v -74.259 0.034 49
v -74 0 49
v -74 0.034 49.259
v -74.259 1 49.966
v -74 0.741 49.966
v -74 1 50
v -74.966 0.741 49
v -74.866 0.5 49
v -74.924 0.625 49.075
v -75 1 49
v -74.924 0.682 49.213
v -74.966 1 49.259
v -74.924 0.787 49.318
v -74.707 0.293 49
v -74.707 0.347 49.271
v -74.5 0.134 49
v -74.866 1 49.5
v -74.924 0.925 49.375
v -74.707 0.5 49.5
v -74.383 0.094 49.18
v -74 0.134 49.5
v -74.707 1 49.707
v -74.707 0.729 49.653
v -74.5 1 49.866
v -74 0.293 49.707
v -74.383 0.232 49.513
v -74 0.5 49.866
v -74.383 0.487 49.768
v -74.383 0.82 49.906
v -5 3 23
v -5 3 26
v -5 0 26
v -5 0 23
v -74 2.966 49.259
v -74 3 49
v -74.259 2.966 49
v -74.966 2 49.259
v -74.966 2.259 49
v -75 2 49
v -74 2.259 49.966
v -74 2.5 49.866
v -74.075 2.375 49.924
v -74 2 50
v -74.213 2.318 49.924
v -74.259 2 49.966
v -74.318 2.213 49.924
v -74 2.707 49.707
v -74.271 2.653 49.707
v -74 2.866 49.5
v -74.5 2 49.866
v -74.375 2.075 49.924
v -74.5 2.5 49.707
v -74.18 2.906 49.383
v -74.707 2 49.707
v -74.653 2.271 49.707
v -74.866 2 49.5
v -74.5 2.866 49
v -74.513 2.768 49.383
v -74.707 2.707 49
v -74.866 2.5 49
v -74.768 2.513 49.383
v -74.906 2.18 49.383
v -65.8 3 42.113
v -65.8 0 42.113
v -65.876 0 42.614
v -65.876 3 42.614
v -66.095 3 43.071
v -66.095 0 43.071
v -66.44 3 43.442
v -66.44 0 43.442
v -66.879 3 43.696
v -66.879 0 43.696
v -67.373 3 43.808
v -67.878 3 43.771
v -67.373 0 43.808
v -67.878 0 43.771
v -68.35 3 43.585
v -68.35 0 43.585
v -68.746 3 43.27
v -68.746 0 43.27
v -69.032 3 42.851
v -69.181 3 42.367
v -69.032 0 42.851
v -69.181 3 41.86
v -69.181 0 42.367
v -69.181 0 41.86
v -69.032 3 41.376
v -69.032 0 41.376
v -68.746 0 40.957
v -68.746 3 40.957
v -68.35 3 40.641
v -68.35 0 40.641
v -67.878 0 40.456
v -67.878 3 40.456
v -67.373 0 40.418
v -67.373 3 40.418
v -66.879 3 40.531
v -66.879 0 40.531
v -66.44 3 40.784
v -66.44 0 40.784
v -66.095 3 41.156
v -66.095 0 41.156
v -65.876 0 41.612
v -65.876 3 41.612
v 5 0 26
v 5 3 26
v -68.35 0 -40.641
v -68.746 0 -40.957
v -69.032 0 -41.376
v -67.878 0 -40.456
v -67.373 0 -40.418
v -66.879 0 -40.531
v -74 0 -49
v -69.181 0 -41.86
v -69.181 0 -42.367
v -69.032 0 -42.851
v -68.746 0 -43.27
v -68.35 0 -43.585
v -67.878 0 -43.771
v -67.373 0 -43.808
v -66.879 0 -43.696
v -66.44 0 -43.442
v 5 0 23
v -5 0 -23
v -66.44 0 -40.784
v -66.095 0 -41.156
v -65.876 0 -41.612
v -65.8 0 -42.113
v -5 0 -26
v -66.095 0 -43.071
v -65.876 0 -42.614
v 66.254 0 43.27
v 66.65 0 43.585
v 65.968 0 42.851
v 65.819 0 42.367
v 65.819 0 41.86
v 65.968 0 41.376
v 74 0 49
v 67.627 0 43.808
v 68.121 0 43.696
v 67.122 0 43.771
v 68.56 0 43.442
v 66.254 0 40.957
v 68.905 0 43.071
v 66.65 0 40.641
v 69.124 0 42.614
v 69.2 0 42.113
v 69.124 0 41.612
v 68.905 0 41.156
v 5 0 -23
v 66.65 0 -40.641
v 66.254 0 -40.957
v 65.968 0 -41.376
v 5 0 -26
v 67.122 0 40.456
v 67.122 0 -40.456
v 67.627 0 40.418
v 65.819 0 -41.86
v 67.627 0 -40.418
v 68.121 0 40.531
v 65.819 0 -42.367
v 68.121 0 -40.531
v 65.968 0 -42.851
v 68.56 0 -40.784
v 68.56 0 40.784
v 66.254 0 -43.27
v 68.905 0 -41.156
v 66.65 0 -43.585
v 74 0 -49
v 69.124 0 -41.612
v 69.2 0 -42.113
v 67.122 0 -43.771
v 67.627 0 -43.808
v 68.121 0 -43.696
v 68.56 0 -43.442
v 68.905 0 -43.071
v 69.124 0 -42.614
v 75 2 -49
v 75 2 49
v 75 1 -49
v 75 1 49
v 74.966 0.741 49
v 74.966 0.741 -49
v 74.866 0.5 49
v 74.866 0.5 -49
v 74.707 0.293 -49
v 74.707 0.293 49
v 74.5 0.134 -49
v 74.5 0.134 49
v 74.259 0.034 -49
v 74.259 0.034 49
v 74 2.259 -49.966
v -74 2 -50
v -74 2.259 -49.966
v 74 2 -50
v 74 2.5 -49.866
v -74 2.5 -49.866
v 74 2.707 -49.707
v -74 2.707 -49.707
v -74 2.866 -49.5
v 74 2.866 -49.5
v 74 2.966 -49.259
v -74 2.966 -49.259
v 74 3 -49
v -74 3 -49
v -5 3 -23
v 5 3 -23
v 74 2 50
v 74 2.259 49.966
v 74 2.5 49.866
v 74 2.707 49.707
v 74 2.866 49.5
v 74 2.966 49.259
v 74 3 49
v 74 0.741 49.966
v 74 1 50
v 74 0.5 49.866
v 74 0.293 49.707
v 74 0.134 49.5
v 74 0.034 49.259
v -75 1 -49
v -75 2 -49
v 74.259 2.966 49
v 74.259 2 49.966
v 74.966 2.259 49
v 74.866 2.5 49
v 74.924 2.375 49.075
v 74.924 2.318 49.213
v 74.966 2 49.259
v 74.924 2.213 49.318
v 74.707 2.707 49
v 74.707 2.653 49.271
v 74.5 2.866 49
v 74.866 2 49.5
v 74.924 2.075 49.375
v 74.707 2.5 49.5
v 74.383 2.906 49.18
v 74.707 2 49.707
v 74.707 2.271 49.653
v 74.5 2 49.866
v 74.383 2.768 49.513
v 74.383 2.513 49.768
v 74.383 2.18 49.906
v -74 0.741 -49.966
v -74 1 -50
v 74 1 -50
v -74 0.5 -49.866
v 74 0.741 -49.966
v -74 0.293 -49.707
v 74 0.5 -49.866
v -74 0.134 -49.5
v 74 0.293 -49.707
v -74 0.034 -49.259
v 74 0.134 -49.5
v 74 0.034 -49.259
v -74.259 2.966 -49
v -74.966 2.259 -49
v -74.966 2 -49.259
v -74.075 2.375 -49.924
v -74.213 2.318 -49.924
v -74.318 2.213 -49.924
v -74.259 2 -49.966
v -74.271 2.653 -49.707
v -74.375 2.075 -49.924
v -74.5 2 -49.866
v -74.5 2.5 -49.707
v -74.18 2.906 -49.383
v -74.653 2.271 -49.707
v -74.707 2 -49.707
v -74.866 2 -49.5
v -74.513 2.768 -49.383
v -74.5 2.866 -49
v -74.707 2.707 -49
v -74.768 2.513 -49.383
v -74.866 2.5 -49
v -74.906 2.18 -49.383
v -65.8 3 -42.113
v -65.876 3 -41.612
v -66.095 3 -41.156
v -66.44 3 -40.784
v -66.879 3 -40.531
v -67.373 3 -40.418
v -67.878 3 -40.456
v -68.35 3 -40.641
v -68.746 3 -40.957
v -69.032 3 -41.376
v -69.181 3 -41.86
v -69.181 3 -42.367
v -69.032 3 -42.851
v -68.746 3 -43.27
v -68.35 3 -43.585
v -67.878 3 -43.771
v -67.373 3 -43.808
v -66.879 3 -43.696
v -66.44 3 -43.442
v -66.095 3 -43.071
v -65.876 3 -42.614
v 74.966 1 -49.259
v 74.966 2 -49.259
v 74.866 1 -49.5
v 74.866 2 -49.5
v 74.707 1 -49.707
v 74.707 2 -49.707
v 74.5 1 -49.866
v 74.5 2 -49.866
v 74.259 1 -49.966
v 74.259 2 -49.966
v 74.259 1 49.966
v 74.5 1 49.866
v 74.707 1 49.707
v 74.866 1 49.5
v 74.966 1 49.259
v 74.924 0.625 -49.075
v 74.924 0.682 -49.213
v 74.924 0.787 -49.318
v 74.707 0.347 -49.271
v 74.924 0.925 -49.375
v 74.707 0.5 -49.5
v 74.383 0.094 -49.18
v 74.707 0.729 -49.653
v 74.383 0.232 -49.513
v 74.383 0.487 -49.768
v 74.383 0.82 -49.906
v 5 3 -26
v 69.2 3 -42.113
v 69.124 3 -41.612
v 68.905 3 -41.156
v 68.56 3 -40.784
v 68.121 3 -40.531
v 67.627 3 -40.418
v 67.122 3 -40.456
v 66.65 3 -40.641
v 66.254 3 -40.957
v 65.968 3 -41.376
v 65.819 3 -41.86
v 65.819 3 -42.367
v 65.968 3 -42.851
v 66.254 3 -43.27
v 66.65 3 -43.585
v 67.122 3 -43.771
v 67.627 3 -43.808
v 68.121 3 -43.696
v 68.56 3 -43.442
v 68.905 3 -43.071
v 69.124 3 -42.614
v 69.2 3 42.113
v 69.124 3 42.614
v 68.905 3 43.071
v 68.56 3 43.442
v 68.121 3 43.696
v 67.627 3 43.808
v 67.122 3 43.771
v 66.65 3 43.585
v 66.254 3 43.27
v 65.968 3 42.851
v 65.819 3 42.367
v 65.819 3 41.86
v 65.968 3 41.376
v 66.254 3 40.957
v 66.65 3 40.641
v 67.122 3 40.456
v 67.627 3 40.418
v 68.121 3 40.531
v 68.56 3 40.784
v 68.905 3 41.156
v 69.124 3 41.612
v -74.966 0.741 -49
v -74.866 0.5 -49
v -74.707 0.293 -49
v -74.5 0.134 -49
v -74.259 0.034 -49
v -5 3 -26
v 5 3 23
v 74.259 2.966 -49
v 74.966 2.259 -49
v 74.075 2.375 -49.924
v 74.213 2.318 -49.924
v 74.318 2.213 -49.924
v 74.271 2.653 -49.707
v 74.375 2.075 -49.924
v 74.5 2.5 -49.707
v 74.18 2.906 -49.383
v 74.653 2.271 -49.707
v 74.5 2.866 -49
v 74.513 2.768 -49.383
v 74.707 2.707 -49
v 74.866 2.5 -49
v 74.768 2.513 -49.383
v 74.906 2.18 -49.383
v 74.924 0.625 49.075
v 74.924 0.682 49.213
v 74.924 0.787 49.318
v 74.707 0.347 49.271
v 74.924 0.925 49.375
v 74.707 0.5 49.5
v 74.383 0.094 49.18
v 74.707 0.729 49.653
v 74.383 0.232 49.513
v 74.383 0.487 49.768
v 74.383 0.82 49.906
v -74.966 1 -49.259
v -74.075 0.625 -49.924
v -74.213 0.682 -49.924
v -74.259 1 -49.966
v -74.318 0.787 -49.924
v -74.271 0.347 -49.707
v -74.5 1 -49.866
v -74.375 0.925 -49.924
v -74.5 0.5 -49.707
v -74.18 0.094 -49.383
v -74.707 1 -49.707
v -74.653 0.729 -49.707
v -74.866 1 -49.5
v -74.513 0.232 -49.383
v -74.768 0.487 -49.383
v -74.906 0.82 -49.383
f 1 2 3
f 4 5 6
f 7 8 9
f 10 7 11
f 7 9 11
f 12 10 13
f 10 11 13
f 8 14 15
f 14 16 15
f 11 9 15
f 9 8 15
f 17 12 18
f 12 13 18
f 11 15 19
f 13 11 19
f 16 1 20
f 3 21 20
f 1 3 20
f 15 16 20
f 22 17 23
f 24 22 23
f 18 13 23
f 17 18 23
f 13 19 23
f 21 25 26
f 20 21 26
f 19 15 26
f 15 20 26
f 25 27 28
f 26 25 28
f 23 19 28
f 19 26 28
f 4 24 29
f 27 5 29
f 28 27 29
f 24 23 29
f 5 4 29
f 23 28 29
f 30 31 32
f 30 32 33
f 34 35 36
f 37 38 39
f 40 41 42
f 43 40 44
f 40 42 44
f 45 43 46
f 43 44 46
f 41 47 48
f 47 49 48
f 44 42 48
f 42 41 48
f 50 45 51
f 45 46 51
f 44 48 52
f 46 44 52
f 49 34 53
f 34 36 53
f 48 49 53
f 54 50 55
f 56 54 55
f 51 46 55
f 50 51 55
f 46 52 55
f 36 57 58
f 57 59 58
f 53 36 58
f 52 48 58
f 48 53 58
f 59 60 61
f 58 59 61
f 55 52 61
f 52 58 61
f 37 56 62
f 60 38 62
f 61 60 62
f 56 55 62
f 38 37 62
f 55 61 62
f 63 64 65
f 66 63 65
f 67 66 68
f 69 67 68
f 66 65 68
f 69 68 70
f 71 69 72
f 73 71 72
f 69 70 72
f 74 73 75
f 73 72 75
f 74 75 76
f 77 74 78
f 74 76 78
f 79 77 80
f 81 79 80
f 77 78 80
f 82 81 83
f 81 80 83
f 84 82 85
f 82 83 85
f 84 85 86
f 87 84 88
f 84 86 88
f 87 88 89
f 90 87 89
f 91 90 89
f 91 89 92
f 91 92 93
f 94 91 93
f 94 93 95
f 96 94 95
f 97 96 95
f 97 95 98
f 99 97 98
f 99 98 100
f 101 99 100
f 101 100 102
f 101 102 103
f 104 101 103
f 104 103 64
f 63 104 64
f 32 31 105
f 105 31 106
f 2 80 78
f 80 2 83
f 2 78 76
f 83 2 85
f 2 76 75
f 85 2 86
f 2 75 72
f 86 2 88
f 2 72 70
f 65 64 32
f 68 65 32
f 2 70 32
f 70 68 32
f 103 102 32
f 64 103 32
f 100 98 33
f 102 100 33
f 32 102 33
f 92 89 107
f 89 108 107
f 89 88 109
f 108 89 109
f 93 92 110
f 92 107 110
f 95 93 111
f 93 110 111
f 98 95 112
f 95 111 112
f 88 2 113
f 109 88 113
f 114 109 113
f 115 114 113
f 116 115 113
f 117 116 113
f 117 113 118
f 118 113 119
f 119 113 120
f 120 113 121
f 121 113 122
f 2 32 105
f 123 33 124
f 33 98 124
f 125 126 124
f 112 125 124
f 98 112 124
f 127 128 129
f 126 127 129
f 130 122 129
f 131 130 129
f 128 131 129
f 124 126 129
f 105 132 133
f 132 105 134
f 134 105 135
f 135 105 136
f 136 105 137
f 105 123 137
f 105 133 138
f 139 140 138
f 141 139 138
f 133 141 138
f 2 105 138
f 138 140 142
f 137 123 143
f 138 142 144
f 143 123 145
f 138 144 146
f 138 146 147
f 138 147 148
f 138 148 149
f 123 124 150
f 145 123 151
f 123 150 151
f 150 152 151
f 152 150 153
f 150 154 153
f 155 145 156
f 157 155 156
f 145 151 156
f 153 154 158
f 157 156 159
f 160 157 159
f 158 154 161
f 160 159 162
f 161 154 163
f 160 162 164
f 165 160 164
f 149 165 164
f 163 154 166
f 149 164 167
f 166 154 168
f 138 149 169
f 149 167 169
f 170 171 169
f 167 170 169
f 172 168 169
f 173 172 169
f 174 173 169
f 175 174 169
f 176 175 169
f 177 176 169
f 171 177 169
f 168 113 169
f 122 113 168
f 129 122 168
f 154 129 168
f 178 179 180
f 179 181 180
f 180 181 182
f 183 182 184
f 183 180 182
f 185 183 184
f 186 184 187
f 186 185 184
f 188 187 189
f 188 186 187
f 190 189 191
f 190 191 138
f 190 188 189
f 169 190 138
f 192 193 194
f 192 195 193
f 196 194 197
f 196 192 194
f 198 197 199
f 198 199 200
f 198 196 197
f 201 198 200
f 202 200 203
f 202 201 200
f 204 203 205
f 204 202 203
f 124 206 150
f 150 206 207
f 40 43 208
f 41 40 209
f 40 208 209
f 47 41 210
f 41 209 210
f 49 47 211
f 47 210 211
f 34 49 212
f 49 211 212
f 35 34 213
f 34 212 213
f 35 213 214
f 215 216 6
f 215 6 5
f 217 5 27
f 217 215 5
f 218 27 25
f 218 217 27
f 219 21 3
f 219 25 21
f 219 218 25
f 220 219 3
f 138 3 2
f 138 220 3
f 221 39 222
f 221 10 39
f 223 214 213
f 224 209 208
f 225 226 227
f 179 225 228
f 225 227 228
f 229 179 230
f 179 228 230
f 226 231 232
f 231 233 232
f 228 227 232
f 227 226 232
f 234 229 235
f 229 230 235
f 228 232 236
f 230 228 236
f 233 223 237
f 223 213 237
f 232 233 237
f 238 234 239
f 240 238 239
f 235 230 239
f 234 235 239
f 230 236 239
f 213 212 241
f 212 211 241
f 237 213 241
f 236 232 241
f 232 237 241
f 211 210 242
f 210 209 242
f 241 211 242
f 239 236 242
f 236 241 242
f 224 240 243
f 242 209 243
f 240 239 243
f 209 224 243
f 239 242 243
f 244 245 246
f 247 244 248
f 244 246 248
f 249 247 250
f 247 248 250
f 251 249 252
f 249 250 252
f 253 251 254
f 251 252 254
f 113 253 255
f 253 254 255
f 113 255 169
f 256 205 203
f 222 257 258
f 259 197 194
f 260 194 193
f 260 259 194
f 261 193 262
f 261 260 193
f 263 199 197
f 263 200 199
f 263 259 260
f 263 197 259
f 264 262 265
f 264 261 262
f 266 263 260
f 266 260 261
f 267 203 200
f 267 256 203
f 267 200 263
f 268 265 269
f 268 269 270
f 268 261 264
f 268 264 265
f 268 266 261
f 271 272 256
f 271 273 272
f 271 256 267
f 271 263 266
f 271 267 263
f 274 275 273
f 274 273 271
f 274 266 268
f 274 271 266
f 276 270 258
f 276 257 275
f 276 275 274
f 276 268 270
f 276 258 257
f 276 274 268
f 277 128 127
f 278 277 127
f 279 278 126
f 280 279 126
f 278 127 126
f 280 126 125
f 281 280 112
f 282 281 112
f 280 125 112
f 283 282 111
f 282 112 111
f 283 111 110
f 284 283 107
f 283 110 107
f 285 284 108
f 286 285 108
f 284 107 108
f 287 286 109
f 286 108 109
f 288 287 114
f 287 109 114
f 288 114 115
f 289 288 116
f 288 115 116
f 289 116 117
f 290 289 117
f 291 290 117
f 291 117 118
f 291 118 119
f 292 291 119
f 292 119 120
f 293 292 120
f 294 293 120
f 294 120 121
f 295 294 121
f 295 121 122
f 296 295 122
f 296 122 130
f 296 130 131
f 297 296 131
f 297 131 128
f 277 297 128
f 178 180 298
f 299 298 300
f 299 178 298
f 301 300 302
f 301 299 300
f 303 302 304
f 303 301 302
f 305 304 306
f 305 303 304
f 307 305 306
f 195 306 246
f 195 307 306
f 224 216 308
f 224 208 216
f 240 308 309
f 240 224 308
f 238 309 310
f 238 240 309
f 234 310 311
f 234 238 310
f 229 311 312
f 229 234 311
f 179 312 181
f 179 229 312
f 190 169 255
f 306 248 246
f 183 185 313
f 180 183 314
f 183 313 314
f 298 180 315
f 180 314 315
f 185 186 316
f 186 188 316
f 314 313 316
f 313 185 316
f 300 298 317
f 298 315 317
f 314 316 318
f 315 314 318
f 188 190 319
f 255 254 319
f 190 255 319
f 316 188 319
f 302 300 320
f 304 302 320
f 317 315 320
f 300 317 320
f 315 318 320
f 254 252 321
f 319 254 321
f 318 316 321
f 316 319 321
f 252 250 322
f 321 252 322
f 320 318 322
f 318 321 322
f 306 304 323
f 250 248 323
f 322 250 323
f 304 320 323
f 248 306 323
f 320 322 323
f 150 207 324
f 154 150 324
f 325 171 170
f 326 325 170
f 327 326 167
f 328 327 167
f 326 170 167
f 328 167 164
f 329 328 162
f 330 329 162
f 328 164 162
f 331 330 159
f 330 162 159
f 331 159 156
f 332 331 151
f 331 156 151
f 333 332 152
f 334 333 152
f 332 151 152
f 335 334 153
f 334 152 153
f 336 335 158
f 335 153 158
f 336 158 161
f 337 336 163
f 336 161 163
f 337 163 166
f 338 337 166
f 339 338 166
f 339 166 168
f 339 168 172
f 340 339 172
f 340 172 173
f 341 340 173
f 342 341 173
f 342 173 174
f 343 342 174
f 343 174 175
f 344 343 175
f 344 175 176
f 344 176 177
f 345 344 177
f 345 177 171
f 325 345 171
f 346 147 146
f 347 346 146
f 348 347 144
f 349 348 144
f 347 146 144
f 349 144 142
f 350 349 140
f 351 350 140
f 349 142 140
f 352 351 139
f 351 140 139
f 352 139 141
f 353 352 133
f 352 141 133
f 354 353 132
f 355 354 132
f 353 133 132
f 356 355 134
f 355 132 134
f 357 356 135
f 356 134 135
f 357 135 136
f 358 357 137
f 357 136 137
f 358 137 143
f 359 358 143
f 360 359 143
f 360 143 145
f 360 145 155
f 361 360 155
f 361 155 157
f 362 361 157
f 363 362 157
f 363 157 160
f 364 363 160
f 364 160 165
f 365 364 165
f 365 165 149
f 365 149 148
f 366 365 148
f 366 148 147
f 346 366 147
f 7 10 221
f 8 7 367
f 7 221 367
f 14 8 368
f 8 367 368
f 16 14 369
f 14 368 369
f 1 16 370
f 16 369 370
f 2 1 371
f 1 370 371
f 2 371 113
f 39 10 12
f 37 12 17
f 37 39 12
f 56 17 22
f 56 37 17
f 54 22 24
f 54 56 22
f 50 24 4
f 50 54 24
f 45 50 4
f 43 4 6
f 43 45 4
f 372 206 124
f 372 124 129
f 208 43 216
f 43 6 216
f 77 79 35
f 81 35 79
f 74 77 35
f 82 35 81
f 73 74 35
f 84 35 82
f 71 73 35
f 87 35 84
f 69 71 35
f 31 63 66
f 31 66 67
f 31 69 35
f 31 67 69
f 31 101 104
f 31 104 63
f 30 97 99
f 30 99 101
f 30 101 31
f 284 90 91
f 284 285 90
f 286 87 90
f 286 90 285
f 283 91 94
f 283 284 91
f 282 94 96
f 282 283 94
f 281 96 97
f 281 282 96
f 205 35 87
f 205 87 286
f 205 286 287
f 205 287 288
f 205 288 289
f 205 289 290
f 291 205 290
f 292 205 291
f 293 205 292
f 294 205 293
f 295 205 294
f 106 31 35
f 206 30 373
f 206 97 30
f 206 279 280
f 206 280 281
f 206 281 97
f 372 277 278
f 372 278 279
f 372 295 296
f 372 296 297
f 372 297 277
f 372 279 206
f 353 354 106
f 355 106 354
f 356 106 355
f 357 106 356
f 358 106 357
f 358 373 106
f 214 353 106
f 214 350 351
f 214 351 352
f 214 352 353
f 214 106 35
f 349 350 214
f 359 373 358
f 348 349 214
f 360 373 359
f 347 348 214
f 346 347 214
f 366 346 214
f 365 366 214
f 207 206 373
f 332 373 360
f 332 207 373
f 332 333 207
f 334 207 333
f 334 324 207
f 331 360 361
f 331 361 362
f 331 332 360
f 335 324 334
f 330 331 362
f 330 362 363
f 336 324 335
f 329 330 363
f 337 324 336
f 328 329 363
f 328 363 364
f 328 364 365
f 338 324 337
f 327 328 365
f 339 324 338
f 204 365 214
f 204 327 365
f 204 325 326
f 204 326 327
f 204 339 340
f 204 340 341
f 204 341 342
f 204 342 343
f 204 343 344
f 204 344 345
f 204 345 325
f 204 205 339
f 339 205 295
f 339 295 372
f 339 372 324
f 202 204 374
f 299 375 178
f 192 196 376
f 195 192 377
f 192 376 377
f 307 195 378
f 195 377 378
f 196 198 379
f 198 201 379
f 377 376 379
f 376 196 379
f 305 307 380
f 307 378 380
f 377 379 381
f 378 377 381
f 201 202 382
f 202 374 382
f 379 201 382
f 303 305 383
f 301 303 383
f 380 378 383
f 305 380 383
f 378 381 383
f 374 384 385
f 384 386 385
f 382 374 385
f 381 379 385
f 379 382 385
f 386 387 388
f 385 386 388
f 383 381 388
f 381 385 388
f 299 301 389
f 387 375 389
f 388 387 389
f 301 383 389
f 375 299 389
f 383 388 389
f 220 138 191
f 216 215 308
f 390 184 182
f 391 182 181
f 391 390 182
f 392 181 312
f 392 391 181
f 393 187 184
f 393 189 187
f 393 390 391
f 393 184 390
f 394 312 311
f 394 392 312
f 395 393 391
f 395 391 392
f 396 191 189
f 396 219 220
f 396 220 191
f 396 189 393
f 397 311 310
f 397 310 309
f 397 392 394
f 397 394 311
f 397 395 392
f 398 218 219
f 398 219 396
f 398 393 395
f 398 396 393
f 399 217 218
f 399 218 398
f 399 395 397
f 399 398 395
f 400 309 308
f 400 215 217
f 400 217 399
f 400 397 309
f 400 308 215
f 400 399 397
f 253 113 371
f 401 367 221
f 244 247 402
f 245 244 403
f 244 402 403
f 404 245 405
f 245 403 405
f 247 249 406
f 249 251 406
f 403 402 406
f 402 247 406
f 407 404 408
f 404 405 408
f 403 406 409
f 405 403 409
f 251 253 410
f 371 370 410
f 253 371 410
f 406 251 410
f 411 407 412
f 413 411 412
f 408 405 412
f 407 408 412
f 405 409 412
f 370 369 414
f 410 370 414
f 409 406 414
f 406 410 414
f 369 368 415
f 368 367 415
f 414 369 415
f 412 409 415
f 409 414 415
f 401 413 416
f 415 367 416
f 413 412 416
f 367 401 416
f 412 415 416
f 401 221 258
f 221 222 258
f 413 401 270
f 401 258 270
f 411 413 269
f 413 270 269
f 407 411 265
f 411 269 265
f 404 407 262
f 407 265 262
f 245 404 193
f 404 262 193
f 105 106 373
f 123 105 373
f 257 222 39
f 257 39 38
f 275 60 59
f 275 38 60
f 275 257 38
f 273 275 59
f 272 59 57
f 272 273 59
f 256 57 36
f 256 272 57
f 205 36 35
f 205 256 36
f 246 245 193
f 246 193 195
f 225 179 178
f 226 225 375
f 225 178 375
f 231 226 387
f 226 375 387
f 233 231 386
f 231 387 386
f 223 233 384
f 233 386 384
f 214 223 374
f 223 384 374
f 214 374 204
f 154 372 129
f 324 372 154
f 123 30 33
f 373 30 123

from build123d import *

# Parameters (mm, degrees)
ESQUISSE1_W             = 150
ESQUISSE1_H             = 100
BOSS_EXTRU_1_DEPTH      = 3
CONG_1_R                = 1
D_GAGEMENT_M31_D        = 3.4
D_GAGEMENT_M31_DEPTH    = 5
D_GAGEMENT_M31_TIP      = 1.021463052
ESQUISSE4_W             = 10
ESQUISSE4_H             = 3
ENL_V_MAT_EXTRU_1_DEPTH = 3


with BuildPart() as part:
    # Esquisse1 → Boss.-Extru.1 (new body)
    with BuildSketch(Plane(origin=(0, 0, 0), x_dir=(1, 0, 0), z_dir=(0, 1, 0))):
        Rectangle(ESQUISSE1_W, ESQUISSE1_H)
    extrude(amount=BOSS_EXTRU_1_DEPTH)

    # Congé1
    cong_1_edges = [part.edges().sort_by_distance(p)[0] for p in [
        (-75, 3, 0),
        (0, 3, 50),
        (75, 3, 0),
        (0, 0, 50),
        (-75, 0, 0),
        (0, 0, -50),
        (75, 0, 0),
        (0, 3, -50),
        (75, 1.5, 50),
        (-75, 1.5, 50),
        (-75, 1.5, -50),
        (75, 1.5, -50),
    ]]
    fillet(cong_1_edges, radius=CONG_1_R)

    # Dégagement M31
    with Locations(Plane(origin=(0, 3, 0), x_dir=(-1, 0, 0), z_dir=(0, 1, 0))):
        with Locations((67.5, 42.113248654), (-67.5, 42.113248654), (-67.5, -42.113248654), (67.5, -42.113248654)):
            Hole(D_GAGEMENT_M31_D / 2, depth=D_GAGEMENT_M31_DEPTH)
            with Locations((0, 0, -(D_GAGEMENT_M31_DEPTH + D_GAGEMENT_M31_TIP / 2))):  # 118° drill point
                Cone(0, D_GAGEMENT_M31_D / 2, D_GAGEMENT_M31_TIP, mode=Mode.SUBTRACT)

    # Esquisse4 → Enlèv. mat.-Extru.1 (cut)
    with BuildSketch(Plane(origin=(0, 3, 0), x_dir=(1, 0, 0), z_dir=(0, 1, 0))):
        with Locations((0, 24.5)):
            Rectangle(ESQUISSE4_W, ESQUISSE4_H)
        with Locations((0, -24.5)):
            Rectangle(ESQUISSE4_W, ESQUISSE4_H)
    extrude(amount=-ENL_V_MAT_EXTRU_1_DEPTH, mode=Mode.SUBTRACT)


solid = part.part
